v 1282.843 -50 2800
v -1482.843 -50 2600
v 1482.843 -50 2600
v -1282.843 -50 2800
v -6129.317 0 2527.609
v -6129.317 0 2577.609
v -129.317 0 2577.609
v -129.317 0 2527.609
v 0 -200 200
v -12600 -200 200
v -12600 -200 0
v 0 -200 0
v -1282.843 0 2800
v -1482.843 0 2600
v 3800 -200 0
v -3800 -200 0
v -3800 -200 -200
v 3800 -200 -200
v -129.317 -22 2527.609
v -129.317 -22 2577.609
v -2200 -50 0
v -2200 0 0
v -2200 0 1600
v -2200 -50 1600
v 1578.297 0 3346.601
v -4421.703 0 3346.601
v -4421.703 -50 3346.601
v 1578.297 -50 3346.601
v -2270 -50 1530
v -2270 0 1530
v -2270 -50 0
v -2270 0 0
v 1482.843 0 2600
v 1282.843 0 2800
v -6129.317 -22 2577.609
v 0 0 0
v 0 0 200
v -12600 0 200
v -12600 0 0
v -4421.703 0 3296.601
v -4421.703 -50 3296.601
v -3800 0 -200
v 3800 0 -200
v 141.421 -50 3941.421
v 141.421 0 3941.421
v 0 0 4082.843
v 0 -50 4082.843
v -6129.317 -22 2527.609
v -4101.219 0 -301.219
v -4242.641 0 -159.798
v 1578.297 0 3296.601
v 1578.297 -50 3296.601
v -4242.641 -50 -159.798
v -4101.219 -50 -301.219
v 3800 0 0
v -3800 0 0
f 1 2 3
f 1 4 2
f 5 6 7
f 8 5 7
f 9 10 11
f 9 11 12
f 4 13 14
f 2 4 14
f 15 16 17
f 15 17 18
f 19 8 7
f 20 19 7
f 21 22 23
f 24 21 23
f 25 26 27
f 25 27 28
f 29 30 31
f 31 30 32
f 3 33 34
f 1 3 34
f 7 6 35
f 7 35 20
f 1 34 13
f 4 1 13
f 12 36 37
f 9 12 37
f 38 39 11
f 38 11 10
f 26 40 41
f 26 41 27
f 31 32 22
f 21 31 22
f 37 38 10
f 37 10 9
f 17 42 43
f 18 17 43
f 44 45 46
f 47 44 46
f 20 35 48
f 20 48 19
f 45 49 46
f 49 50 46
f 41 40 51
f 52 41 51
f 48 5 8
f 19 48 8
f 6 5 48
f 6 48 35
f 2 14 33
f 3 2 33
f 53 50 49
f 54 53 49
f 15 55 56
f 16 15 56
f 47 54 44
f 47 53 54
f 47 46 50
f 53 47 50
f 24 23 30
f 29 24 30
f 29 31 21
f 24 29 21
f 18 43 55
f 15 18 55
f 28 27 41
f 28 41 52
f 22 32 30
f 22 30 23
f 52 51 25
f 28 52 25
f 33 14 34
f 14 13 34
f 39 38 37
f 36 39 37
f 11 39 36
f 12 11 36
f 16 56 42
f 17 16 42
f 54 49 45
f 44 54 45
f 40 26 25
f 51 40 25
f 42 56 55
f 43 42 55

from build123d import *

# Parameters (mm, degrees)
F1_DEPTH  = 200
F2_DEPTH  = 50
F3_DEPTH  = 50
F4_DEPTH  = 50
F5_W      = 12600
F5_H      = 200
F6_DEPTH  = 200
F7_W      = 6000
F7_H      = 50
F8_DEPTH  = 22
F9_W      = 6000
F9_H      = 50
F10_DEPTH = 50


with BuildPart() as f1:
    # F0 (on Front) → F1 (new body)
    with BuildSketch(Plane.XZ):
        Polygon((-2270, 0), (-3800, 0), (-3800, -200), (3800, -200), (3800, 0), (2270, 0), (2200, 0), (-2200, 0), align=None)
    extrude(amount=F1_DEPTH)


with BuildPart() as f2:
    # F0 (on Front) → F2 (new body)
    with BuildSketch(Plane.XZ):
        Polygon((-2270, 1530), (-2270, 0), (-2200, 0), (-2200, 1600), align=None)
    extrude(amount=F2_DEPTH)


with BuildPart() as f3:
    # F0 (on Front) → F3 (new body)
    with BuildSketch(Plane.XZ):
        Polygon((-1482.8427124746, 2600), (-1200, 2600), (-1000, 2800), (-1282.8427124746, 2800), align=None)
        Polygon((-1000, 2800), (-1200, 2600), (1200, 2600), (1000, 2800), align=None)
        Polygon((1000, 2800), (1200, 2600), (1482.8427124746, 2600), (1282.8427124746, 2800), align=None)
    extrude(amount=F3_DEPTH)


with BuildPart() as f4:
    # F0 (on Front) → F4 (new body)
    with BuildSketch(Plane.XZ):
        Polygon((-4101.219330882, -301.219330882), (-3800, 0), (-2270, 1530), (-2200, 1600), (-1200, 2600), (-1482.8427124746, 2600), (-4242.6406871193, -159.7979746447), align=None)
        Polygon((-1482.8427124746, 2600), (-1200, 2600), (-1000, 2800), (-1282.8427124746, 2800), align=None)
        Polygon((-1282.8427124746, 2800), (-1000, 2800), (0, 3800), (-141.4213562373, 3941.4213562373), align=None)
        Polygon((-141.4213562373, 3941.4213562373), (0, 3800), (141.4213562373, 3941.4213562373), (0, 4082.8427124746), align=None)
    extrude(amount=F4_DEPTH)


with BuildPart() as f6:
    # F5 (on Front) → F6 (new body)
    with BuildSketch(Plane.XZ):
        with Locations((-6300, 100)):
            Rectangle(F5_W, F5_H)
    extrude(amount=F6_DEPTH)


with BuildPart() as f8:
    # F7 (on Front) → F8 (new body)
    with BuildSketch(Plane.XZ):
        with Locations((-3129.3168067932, 2552.6093482971)):
            Rectangle(F7_W, F7_H)
    extrude(amount=F8_DEPTH)


with BuildPart() as f10:
    # F9 (on Front) → F10 (new body)
    with BuildSketch(Plane.XZ):
        with Locations((-1421.7028617859, 3321.6012954712)):
            Rectangle(F9_W, F9_H)
    extrude(amount=F10_DEPTH)


solid = Compound([f1.part, f2.part, f3.part, f4.part, f6.part, f8.part, f10.part])
